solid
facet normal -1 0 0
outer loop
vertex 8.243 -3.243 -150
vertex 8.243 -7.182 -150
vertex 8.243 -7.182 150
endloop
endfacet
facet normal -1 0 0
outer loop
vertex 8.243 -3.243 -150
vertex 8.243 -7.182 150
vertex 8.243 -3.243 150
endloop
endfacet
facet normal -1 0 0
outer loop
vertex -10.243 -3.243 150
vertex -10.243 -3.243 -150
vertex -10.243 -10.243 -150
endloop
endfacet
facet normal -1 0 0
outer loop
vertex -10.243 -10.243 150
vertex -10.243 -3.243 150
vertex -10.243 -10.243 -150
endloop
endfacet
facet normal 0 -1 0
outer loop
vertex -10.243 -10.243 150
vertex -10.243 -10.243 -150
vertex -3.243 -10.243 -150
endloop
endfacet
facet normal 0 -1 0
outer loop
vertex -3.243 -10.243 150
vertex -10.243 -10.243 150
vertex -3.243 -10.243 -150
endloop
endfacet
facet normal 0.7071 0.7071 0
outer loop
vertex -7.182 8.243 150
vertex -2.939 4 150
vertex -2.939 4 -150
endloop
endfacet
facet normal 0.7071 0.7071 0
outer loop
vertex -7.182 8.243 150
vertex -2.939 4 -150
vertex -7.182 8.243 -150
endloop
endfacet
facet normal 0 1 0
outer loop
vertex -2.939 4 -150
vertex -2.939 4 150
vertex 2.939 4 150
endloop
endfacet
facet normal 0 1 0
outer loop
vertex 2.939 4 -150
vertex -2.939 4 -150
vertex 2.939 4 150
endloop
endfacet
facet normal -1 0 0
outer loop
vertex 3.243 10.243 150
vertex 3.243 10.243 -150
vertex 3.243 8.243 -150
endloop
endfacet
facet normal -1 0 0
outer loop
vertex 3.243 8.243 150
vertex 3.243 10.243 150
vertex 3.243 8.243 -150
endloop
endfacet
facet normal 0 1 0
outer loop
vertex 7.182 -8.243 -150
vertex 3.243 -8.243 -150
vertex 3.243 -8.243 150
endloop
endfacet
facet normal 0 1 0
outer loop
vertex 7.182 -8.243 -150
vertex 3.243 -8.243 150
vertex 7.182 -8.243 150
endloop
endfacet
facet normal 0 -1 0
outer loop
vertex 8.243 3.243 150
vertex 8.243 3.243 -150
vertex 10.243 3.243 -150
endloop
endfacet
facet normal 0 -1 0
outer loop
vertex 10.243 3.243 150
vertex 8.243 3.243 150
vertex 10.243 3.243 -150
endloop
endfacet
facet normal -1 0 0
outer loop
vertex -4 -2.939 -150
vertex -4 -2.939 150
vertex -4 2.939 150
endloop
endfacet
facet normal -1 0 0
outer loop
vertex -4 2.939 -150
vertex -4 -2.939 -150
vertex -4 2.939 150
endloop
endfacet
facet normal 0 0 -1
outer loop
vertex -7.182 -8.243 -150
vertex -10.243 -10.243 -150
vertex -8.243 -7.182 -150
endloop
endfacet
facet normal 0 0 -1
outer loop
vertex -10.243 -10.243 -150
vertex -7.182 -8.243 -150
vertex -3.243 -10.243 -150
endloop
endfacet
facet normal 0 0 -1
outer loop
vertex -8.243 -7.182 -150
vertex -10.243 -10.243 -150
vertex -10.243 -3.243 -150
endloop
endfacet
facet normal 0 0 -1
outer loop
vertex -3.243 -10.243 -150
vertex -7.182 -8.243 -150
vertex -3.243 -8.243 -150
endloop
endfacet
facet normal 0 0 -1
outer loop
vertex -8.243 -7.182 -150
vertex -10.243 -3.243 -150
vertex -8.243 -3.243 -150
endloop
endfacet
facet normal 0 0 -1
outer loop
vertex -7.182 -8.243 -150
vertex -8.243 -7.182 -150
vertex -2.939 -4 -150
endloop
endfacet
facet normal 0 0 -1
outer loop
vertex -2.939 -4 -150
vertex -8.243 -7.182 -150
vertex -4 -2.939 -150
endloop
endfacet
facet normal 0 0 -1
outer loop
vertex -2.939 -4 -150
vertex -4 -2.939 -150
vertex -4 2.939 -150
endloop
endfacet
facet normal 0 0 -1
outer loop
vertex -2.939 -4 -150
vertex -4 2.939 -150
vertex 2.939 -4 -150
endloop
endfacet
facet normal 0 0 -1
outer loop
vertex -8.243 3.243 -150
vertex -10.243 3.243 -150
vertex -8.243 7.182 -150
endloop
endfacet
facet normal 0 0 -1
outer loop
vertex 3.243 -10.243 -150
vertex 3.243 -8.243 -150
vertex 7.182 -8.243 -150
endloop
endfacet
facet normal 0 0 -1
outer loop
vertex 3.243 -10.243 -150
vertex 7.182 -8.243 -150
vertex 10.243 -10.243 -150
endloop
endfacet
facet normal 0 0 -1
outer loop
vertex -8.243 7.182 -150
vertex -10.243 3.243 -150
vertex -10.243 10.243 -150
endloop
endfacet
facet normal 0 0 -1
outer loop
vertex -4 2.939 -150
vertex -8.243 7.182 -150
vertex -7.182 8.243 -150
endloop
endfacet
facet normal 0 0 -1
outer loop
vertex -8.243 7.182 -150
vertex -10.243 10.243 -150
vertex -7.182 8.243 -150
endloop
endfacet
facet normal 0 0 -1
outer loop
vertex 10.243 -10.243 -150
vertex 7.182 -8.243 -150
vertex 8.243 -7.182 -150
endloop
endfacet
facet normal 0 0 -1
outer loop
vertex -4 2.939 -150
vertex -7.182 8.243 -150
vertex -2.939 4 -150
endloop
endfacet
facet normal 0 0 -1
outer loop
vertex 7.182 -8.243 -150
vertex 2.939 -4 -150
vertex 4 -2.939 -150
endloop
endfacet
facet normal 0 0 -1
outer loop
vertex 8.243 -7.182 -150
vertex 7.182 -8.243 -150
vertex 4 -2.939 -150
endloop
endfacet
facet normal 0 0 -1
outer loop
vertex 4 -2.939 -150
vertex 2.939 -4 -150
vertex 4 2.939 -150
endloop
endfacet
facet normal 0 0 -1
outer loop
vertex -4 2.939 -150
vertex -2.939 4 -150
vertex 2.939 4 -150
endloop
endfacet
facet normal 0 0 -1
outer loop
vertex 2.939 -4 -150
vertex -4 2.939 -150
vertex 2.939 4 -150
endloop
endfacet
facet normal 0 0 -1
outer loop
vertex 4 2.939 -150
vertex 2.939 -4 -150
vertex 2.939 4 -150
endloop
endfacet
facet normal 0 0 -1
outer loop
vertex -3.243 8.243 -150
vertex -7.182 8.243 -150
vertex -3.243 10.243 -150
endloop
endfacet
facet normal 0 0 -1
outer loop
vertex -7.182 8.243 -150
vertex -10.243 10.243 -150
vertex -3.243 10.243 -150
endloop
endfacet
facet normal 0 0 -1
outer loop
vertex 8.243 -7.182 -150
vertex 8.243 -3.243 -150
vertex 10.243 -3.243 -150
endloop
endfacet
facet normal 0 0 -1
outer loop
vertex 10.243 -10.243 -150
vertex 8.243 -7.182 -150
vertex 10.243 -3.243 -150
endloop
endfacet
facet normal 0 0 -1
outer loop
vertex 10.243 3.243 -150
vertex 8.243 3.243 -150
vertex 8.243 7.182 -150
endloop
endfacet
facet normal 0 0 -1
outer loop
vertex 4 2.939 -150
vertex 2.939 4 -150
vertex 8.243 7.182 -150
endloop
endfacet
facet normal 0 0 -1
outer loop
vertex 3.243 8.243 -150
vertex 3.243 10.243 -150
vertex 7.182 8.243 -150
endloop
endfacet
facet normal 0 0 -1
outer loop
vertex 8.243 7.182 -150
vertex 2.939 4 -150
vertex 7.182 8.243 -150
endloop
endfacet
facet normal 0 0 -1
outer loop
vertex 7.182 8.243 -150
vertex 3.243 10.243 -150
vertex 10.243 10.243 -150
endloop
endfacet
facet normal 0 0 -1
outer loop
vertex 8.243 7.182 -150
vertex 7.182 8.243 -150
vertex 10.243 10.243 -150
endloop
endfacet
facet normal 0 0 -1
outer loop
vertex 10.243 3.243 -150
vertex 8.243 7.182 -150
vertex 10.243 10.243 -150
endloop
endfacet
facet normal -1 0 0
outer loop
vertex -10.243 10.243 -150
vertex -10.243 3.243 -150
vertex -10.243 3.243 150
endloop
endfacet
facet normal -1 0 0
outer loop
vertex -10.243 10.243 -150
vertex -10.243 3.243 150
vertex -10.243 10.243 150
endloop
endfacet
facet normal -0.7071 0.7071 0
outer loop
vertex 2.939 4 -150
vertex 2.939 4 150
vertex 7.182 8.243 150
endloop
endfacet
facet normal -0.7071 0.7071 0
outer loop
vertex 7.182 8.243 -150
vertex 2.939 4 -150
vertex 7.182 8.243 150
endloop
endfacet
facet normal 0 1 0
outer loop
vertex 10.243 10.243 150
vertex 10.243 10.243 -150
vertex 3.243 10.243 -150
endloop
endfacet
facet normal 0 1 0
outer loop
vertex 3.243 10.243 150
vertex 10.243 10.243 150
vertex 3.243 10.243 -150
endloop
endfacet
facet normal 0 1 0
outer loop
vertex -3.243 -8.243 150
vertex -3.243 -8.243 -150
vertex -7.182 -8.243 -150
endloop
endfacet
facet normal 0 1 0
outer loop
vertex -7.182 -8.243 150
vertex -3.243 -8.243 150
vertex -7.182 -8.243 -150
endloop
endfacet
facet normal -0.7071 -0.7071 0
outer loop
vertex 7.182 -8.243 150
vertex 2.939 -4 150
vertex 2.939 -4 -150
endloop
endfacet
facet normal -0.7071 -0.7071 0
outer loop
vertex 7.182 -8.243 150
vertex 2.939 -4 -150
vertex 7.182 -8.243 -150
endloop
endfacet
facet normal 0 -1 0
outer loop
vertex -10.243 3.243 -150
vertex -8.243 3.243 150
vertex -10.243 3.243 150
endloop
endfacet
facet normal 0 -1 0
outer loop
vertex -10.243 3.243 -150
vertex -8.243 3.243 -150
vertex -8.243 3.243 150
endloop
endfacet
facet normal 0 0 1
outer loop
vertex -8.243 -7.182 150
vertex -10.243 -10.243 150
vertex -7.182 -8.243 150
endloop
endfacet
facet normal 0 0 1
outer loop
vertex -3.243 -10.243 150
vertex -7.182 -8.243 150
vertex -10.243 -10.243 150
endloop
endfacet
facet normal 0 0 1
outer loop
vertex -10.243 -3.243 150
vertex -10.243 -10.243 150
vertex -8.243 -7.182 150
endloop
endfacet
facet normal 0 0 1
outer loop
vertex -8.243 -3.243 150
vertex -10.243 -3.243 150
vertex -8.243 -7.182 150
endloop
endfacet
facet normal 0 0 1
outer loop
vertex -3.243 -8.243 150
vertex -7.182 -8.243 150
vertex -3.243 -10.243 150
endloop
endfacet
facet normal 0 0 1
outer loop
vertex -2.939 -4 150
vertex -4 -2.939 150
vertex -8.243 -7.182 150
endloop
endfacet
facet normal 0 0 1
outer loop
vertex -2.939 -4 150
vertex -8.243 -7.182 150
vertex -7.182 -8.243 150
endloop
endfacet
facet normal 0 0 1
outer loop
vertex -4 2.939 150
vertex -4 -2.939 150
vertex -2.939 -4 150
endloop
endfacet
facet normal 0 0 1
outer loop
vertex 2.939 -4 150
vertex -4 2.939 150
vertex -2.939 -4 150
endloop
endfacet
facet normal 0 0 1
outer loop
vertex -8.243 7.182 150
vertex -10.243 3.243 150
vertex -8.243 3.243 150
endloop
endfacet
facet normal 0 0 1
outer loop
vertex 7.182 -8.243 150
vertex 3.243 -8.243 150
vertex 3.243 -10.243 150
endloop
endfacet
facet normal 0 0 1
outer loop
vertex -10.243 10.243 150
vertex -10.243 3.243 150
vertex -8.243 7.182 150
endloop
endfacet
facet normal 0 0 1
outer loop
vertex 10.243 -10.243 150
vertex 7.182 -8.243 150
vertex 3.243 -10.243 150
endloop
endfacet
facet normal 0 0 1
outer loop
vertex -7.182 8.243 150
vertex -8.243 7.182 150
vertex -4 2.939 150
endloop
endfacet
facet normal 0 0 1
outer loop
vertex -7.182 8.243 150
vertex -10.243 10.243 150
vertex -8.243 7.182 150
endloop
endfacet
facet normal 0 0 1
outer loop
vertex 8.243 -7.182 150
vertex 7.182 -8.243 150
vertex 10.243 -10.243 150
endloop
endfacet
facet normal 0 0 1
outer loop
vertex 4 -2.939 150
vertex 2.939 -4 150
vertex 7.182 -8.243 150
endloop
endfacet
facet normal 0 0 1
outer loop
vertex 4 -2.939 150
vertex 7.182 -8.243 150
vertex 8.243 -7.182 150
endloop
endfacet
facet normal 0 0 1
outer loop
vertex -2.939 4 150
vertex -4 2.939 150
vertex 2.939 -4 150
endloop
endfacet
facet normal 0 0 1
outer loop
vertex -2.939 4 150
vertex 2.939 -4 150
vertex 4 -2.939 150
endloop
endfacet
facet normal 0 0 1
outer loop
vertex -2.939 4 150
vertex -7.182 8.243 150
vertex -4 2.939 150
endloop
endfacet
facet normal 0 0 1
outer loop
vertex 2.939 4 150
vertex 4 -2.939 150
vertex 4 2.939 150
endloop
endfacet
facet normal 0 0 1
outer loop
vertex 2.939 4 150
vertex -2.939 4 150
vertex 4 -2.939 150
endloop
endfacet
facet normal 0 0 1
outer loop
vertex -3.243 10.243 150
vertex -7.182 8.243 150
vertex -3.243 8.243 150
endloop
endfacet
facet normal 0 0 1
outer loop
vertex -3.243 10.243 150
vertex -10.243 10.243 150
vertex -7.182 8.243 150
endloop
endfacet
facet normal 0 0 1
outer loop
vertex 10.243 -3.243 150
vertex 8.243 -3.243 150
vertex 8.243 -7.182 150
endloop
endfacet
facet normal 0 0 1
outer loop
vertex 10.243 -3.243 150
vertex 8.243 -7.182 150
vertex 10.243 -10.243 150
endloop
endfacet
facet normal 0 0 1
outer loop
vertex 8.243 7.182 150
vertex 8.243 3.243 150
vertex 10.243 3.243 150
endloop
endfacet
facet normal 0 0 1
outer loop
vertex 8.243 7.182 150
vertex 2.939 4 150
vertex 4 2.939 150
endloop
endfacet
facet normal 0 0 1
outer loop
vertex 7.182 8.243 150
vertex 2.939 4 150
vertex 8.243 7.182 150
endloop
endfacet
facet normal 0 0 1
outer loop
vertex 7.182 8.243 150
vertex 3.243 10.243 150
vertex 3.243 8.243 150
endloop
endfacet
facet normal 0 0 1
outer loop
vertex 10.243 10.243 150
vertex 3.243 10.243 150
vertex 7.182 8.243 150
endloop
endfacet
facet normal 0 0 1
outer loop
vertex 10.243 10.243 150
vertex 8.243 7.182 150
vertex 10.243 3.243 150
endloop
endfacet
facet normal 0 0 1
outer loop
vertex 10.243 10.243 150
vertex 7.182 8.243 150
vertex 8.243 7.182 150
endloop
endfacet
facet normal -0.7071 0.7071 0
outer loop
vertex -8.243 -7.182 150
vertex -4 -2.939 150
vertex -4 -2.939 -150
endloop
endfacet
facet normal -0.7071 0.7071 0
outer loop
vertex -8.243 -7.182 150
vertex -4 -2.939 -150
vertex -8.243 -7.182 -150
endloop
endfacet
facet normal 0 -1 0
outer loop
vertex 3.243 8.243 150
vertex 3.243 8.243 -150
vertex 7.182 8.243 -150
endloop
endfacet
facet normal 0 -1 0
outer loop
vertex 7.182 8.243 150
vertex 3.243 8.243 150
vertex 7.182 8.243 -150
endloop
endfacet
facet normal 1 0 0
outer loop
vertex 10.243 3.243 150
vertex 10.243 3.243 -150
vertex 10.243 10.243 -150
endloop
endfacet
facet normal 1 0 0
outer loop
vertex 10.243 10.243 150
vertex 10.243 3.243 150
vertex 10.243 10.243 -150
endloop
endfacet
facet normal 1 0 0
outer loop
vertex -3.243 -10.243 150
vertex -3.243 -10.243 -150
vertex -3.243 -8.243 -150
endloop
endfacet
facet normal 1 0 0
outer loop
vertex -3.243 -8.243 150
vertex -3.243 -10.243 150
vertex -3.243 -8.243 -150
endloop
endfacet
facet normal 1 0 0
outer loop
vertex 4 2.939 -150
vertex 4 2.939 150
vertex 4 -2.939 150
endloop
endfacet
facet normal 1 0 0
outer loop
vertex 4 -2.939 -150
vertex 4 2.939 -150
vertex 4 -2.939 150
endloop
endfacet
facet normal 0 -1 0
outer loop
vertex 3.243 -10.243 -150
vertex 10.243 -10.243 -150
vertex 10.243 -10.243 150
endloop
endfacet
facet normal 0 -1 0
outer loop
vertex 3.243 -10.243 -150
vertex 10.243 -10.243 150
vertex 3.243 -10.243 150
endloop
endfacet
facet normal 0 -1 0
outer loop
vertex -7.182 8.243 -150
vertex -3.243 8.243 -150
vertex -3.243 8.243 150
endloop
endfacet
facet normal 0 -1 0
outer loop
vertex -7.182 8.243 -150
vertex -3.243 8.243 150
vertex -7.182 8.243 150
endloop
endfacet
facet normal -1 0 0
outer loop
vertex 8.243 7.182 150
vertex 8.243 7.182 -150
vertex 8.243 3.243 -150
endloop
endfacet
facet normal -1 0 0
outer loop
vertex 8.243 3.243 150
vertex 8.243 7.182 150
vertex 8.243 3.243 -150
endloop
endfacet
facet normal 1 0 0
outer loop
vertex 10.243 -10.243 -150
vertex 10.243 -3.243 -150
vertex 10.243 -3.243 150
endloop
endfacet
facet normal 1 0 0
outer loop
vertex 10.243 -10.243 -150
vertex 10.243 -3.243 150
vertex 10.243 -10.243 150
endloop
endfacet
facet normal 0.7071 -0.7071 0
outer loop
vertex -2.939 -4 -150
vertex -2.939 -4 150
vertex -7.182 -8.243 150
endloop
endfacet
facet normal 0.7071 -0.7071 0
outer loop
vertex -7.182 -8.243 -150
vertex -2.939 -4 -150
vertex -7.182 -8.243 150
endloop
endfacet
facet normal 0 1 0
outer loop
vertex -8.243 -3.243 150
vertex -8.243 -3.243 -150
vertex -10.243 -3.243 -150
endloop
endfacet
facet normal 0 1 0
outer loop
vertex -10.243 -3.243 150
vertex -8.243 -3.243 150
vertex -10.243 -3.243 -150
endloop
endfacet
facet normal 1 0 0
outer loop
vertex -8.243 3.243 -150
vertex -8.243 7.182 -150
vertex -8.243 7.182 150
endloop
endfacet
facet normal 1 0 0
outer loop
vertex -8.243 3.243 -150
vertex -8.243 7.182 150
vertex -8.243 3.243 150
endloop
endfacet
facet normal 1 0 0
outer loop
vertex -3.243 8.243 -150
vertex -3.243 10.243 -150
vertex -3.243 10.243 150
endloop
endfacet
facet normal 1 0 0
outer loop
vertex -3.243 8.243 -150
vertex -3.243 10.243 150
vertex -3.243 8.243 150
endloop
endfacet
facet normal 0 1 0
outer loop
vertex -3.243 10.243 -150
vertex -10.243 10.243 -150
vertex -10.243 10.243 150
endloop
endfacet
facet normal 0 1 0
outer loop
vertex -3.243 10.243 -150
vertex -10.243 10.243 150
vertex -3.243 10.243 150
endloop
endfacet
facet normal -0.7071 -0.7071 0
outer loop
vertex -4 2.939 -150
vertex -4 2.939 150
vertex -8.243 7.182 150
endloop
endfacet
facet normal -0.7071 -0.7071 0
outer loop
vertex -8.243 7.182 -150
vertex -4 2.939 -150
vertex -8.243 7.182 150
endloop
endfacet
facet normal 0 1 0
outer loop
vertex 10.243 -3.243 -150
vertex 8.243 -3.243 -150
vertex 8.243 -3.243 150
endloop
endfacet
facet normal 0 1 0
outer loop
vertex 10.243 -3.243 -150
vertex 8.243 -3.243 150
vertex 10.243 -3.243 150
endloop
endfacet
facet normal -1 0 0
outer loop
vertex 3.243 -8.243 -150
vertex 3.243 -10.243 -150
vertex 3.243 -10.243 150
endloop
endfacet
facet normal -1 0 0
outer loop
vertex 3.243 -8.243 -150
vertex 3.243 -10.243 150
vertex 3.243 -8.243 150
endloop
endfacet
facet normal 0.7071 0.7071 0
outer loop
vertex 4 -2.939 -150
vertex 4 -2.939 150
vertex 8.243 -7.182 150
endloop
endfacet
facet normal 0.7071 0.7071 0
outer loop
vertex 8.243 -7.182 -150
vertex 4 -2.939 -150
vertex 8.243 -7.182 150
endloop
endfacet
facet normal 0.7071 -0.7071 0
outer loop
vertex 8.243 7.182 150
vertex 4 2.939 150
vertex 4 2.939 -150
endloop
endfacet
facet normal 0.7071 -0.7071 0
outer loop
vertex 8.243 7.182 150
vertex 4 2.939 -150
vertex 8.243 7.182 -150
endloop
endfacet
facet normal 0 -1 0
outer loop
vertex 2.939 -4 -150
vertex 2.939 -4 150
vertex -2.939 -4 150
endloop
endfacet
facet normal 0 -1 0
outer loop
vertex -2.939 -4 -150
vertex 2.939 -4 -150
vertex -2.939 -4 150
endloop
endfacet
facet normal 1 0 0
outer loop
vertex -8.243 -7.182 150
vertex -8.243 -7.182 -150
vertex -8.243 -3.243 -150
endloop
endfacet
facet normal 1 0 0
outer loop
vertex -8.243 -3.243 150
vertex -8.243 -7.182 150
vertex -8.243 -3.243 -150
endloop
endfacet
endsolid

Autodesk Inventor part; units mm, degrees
ref_plane "YZ Plane" through (0, 0, 0) normal (1, 0, 0) x (0, 1, 0)
ref_plane "XZ Plane" through (0, 0, 0) normal (0, 1, 0) x (-1, 0, 0)
ref_plane "XY Plane" through (0, 0, 0) normal (0, 0, 1) x (1, 0, 0)
sketch "Sketch1" plane through (0, 0, 0) normal (0, 0, 1) x (1, 0, 0)
  line L0 (-2.9393, 4) -> (2.9393, 4)
  line L1 (4, 2.9393) -> (4, -2.9393)
  line L2 (2.9393, -4) -> (-2.9393, -4)
  line L3 (-4, -2.9393) -> (-4, 2.9393)
  line L4 (0, 0) -> (4, -4) construction
  line L5 (-0.5303, -0.5303) -> (-4, -4) construction
  line L6 (5.0607, 4) -> (10, 4) construction
  line L7 (8.2426, 7.182) -> (8.2426, 3.2426)
  line L8 (8.2426, 3.2426) -> (10.2426, 3.2426)
  line L9 (10.2426, 3.2426) -> (10.2426, 10.2426)
  line L10 (10.2426, 10.2426) -> (3.2426, 10.2426)
  line L11 (3.2426, 10.2426) -> (3.2426, 8.2426)
  line L12 (3.2426, 8.2426) -> (7.182, 8.2426)
  line L13 (2.9393, 4) -> (7.182, 8.2426)
  line L14 (4, 2.9393) -> (8.2426, 7.182)
  line L15 (-8.2426, 7.182) -> (-8.2426, 3.2426)
  line L16 (-8.2426, 3.2426) -> (-10.2426, 3.2426)
  line L17 (-10.2426, 3.2426) -> (-10.2426, 10.2426)
  line L18 (-10.2426, 10.2426) -> (-3.2426, 10.2426)
  line L19 (-3.2426, 10.2426) -> (-3.2426, 8.2426)
  line L20 (-3.2426, 8.2426) -> (-7.182, 8.2426)
  line L21 (-2.9393, 4) -> (-7.182, 8.2426)
  line L22 (-4, 2.9393) -> (-8.2426, 7.182)
  line L23 (-2.9393, -4) -> (2.9393, -4)
  line L24 (4, -2.9393) -> (4, 2.9393)
  line L25 (-4, 2.9393) -> (-4, -2.9393)
  line L26 (-4, -4) -> (0, 0) construction
  line L27 (5.0607, -4) -> (10, -4) construction
  line L28 (8.2426, -7.182) -> (8.2426, -3.2426)
  line L29 (8.2426, -3.2426) -> (10.2426, -3.2426)
  line L30 (10.2426, -3.2426) -> (10.2426, -10.2426)
  line L31 (10.2426, -10.2426) -> (3.2426, -10.2426)
  line L32 (3.2426, -10.2426) -> (3.2426, -8.2426)
  line L33 (3.2426, -8.2426) -> (7.182, -8.2426)
  line L34 (2.9393, -4) -> (7.182, -8.2426)
  line L35 (4, -2.9393) -> (8.2426, -7.182)
  line L36 (-3.2426, -10.2426) -> (-3.2426, -8.2426)
  line L37 (-2.9393, -4) -> (-7.182, -8.2426)
  line L38 (-8.2426, -7.182) -> (-8.2426, -3.2426)
  line L39 (-3.2426, -8.2426) -> (-7.182, -8.2426)
  line L40 (-4, -2.9393) -> (-8.2426, -7.182)
  line L41 (-10.2426, -3.2426) -> (-10.2426, -10.2426)
  line L42 (-10.2426, -10.2426) -> (-3.2426, -10.2426)
  line L43 (-8.2426, -3.2426) -> (-10.2426, -3.2426)
  point P0 (0, 0)
  point P1 (-4, 4)
  point P2 (-4, 4)
  dimension "d0" = 8
extrude "Extrusion1" add sketch "Sketch1" along normal mid plane 300
properties part number "front axle"
